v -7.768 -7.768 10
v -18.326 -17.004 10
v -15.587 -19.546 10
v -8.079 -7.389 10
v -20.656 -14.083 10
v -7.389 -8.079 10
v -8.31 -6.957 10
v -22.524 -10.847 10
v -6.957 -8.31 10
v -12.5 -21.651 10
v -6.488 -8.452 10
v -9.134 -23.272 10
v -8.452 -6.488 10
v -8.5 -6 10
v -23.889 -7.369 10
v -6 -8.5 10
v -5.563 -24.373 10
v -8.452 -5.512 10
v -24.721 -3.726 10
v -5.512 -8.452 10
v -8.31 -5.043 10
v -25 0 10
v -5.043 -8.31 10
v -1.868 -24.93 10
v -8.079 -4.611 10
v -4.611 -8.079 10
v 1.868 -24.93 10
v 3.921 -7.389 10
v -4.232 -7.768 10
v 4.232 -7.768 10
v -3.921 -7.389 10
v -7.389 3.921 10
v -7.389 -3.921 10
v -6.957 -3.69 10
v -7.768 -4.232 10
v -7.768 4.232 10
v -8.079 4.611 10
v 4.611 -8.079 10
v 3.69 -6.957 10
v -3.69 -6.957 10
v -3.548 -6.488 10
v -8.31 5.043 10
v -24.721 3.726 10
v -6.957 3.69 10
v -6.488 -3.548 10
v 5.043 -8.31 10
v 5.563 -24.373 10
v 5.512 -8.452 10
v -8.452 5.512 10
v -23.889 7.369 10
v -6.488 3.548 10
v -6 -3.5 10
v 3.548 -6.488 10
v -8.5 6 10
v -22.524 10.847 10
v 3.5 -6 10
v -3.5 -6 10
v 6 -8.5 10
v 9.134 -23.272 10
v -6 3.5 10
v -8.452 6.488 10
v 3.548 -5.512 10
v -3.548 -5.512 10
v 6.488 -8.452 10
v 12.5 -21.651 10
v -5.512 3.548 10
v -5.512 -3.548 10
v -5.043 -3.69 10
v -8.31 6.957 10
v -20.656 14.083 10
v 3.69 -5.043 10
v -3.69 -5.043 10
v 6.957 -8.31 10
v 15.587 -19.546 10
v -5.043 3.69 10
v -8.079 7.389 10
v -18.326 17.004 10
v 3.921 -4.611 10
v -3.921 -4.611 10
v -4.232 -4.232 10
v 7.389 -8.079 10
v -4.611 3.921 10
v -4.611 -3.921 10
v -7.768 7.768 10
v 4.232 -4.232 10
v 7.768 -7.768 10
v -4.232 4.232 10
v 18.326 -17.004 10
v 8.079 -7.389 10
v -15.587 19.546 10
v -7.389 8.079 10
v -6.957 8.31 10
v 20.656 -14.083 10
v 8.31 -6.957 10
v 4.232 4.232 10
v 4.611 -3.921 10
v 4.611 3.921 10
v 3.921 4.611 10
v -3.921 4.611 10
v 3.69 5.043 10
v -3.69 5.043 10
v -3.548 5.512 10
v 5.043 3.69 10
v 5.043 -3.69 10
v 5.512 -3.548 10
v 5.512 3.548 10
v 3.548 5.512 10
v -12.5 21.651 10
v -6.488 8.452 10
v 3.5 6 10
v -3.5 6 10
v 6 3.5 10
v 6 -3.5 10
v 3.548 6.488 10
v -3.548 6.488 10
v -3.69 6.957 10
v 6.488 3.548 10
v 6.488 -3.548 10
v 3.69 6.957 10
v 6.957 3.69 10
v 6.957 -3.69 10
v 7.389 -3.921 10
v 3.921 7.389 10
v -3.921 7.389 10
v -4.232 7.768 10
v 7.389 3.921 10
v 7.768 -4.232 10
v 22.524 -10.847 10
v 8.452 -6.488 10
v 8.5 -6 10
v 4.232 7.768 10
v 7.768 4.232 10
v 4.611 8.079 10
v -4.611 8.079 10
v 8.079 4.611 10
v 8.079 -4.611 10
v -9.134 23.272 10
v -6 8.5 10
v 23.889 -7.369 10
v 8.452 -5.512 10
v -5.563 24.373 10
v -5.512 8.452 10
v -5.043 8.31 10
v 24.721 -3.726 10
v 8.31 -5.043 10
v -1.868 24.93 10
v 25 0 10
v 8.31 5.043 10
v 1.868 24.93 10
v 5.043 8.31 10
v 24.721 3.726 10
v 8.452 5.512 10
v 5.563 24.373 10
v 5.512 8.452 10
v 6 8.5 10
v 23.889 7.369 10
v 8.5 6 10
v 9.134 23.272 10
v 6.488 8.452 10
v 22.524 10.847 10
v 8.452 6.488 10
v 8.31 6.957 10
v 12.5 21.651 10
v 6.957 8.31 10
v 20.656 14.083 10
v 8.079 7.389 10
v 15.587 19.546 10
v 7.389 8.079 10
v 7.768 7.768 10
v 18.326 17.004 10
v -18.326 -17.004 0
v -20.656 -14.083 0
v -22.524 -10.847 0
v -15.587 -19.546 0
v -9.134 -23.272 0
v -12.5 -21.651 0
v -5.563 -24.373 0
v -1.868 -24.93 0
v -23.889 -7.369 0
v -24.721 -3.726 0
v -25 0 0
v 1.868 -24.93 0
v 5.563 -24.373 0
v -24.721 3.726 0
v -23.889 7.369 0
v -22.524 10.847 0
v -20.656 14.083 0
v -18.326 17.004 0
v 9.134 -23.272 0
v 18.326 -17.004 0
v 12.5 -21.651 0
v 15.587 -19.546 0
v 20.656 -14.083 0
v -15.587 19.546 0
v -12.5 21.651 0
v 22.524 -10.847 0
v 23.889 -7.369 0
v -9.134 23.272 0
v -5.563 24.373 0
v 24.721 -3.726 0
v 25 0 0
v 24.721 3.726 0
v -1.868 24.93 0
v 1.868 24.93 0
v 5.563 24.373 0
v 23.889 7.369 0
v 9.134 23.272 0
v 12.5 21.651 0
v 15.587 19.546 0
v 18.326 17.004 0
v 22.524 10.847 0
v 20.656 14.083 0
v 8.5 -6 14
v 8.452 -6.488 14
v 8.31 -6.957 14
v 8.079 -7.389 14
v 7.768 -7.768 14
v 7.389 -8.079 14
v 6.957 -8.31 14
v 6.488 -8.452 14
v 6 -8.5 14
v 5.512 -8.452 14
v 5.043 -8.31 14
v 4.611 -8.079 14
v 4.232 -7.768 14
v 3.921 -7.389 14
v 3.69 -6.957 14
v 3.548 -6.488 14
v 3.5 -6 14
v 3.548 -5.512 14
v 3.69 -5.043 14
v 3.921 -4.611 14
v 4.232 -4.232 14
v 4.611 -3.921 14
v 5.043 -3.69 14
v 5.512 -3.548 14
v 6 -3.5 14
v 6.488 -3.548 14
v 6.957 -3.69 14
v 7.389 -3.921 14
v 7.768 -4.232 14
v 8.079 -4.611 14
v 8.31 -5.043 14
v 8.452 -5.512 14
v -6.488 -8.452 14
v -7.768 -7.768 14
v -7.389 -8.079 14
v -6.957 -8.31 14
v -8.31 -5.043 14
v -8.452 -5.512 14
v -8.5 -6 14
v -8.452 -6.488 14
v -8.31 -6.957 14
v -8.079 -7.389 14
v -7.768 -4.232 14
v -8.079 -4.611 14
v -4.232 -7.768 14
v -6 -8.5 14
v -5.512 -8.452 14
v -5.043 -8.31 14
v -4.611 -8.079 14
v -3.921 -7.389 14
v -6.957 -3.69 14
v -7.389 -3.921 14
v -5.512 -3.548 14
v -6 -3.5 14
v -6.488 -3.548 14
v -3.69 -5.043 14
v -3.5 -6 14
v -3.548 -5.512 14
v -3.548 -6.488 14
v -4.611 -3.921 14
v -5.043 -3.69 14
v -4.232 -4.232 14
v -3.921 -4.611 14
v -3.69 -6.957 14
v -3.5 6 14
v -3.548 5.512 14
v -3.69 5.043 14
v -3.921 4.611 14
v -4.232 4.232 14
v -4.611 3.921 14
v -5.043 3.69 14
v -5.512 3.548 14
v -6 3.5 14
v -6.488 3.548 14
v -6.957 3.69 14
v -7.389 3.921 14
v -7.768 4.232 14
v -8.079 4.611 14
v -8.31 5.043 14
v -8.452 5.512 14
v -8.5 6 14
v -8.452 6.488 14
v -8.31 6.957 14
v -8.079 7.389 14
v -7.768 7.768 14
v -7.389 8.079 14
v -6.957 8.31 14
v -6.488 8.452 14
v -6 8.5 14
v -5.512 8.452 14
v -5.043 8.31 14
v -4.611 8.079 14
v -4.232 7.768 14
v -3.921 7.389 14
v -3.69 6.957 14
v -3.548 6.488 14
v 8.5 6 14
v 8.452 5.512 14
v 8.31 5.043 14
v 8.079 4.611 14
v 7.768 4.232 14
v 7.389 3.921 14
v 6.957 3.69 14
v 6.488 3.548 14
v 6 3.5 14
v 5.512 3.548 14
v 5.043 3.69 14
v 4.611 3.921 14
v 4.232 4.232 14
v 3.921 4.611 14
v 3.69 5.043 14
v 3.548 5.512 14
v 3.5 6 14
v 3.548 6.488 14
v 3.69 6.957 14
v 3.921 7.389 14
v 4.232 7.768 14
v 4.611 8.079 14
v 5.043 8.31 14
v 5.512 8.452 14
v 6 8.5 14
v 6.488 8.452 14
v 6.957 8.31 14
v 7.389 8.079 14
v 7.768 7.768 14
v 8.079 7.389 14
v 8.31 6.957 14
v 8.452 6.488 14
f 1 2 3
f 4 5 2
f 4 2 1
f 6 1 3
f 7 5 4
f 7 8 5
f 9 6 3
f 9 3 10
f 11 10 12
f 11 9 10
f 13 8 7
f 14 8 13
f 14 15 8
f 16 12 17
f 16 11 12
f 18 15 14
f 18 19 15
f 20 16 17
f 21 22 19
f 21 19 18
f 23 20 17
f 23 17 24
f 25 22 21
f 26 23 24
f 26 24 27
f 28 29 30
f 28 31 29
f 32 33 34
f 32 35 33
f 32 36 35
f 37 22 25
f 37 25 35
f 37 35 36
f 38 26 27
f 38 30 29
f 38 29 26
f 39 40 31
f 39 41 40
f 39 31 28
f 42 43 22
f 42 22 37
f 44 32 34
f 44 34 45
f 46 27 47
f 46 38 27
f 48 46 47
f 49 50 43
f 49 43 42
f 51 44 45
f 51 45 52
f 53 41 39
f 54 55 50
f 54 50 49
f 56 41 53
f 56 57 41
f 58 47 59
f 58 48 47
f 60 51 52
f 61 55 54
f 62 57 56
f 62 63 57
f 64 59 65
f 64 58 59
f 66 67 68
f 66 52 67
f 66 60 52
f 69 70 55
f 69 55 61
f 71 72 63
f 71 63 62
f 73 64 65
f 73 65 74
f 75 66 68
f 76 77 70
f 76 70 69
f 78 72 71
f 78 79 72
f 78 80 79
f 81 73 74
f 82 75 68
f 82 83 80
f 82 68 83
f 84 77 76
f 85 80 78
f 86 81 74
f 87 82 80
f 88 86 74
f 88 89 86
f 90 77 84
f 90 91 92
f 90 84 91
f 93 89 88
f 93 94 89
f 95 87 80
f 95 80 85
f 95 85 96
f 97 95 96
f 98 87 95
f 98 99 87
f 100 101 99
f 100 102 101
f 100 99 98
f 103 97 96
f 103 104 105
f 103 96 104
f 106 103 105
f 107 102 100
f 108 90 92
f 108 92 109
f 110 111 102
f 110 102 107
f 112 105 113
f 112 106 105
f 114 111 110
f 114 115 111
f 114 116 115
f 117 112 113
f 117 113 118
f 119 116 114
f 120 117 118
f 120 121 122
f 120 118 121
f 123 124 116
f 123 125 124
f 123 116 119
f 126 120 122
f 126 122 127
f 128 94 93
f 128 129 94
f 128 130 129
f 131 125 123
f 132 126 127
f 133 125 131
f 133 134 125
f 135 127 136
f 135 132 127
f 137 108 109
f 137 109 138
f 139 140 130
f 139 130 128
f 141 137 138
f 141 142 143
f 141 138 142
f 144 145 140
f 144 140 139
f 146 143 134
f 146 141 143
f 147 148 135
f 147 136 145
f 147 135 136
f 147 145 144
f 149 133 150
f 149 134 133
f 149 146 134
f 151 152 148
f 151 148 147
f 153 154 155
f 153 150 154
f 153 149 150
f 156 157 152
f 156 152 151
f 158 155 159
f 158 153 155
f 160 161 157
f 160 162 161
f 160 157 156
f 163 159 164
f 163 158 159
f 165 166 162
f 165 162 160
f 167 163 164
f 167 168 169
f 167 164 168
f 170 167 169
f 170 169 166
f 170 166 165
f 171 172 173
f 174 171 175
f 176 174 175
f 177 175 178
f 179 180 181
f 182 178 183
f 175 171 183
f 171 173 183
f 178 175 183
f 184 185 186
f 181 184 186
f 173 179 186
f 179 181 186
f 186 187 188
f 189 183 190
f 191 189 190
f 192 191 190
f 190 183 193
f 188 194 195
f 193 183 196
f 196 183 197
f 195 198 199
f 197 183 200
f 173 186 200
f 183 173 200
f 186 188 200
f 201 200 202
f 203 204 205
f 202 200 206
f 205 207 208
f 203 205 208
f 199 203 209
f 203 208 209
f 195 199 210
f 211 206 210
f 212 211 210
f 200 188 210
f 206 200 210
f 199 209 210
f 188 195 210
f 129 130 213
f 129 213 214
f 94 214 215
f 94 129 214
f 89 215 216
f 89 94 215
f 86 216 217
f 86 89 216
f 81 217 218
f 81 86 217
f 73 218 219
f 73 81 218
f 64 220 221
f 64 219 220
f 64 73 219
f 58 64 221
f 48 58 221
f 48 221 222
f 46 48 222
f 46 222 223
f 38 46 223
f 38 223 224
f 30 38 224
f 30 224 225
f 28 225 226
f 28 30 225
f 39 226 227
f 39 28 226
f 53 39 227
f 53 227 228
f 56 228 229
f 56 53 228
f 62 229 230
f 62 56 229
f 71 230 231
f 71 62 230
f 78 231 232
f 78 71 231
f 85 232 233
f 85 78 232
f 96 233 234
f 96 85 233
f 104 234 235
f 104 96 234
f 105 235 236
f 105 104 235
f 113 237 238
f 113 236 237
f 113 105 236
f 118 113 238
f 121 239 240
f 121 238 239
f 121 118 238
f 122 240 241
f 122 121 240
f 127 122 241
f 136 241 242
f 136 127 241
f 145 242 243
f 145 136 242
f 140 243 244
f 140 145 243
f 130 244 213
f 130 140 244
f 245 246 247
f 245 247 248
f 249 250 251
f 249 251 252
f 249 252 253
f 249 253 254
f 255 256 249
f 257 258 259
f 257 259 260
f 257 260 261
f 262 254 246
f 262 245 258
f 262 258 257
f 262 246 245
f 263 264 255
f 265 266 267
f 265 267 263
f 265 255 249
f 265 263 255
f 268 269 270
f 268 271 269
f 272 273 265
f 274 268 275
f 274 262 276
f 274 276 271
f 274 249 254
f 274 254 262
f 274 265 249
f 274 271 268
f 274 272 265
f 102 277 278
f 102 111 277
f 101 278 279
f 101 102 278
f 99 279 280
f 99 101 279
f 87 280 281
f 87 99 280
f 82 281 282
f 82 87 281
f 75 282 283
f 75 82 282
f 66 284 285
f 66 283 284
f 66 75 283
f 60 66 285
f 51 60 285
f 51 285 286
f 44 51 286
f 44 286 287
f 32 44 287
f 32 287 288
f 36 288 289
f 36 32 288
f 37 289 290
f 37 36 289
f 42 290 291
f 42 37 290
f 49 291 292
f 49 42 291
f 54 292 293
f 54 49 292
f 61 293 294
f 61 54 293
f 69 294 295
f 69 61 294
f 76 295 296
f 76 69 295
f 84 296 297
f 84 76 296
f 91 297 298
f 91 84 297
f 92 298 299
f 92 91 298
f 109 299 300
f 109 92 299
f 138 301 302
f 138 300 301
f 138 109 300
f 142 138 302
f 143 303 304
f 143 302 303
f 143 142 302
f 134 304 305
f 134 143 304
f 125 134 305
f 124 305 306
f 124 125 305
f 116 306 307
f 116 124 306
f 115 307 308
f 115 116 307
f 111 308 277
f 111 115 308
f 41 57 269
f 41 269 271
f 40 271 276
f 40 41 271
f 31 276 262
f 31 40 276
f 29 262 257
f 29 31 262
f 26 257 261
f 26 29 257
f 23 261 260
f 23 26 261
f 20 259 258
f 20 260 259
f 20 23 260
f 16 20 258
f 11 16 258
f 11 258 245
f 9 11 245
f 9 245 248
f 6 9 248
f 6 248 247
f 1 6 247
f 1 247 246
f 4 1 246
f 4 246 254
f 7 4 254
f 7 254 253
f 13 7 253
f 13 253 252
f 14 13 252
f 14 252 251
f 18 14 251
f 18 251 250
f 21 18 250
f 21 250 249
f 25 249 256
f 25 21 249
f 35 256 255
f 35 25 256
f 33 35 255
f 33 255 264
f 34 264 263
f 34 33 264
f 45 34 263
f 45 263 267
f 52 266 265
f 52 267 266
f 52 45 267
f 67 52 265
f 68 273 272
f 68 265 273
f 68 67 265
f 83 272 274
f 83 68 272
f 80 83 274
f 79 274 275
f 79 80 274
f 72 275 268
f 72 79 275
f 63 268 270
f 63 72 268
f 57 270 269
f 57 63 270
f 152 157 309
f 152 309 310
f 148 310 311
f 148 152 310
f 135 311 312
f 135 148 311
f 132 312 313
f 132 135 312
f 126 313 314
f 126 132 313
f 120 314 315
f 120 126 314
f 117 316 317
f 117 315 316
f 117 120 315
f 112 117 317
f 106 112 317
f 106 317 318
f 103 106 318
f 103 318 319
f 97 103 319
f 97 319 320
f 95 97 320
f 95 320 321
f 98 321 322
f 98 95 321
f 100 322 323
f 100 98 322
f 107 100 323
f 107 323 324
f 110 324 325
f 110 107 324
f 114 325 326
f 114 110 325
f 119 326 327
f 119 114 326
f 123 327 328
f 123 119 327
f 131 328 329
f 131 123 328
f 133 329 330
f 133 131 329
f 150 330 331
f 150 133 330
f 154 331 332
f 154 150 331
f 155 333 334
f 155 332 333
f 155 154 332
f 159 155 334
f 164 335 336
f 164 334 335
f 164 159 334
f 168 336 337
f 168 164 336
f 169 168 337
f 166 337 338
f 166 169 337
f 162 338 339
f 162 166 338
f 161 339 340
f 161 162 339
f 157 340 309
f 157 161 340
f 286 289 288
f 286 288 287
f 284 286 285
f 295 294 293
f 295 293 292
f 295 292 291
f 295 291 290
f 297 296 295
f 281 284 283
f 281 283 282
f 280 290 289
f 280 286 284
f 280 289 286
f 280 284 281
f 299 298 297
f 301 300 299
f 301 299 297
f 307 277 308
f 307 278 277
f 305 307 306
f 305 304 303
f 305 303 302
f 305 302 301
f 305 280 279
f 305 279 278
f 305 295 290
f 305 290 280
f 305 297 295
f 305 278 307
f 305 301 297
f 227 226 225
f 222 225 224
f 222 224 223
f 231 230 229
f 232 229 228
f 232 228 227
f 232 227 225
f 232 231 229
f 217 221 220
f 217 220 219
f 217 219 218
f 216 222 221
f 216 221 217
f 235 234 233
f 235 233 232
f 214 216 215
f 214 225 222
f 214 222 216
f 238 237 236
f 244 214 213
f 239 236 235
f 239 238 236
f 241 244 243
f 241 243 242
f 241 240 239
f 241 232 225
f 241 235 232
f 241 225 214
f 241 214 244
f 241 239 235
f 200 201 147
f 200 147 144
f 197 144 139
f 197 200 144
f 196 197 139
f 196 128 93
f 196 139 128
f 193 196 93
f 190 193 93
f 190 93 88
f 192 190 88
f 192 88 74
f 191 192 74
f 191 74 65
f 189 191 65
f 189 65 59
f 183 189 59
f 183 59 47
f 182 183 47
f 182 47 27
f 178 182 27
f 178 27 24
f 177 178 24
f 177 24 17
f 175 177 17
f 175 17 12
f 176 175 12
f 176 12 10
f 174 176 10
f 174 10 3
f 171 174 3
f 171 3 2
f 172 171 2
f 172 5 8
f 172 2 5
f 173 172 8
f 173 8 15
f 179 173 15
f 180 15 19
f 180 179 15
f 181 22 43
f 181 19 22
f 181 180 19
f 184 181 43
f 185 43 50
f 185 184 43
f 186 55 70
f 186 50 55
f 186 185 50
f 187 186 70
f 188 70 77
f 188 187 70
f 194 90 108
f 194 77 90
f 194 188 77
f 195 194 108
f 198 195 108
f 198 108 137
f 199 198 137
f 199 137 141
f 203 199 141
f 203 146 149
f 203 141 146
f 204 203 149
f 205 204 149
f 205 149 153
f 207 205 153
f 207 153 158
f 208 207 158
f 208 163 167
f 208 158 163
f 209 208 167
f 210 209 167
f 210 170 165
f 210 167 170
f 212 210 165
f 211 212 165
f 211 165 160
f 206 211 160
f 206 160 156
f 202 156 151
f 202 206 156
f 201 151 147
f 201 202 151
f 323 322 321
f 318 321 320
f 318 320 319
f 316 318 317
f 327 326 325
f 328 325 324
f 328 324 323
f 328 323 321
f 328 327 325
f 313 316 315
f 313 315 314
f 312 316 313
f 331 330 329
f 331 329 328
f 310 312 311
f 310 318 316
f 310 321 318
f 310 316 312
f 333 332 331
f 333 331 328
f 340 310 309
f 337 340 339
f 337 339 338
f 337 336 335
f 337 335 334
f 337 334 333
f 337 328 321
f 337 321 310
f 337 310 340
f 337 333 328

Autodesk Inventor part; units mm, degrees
ref_plane "YZ Plane" through (0, 0, 0) normal (1, 0, 0) x (0, 1, 0)
ref_plane "XZ Plane" through (0, 0, 0) normal (0, 1, 0) x (-1, 0, 0)
ref_plane "XY Plane" through (0, 0, 0) normal (0, 0, 1) x (1, 0, 0)
sketch "Boceto1" plane through (0, 0, 0) normal (0, 0, 1) x (1, 0, 0)
  circle A0 centre (0, 0) radius 25
  dimension "d0" = 50
extrude "Extrusión1" add sketch "Boceto1" along normal blind 10
sketch "Boceto3" plane through (0, 0, 10) normal (0, 0, 1) x (1, 0, 0)
  circle A0 centre (-6, -6) radius 2.5
  line L0 (0, 35) -> (0, -35) projected
  line L1 (-35, 0) -> (35, 0) projected
  circle A1 centre (6, -6) radius 2.5
  circle A2 centre (6, 6) radius 2.5
  circle A3 centre (-6, 6) radius 2.5
  line L2 (-18, -22) -> (18, -22)
  line L3 (18, -22) -> (18, 22)
  line L4 (18, 22) -> (-18, 22)
  line L5 (-18, 22) -> (-18, -22)
  point P0 (0, 0)
  dimension "d3" = 5
  dimension "d4" = 6
  dimension "d5" = 6
  dimension "d8" = 360
  dimension "d12" = 44
  dimension "d13" = 36
  dimension "d14" = 18
  dimension "d16" = 22
extrude "Extrusión2" add sketch "Boceto3" along normal blind 4 contours A0 | A1 | A2 | A3
properties part number "BaseH"
